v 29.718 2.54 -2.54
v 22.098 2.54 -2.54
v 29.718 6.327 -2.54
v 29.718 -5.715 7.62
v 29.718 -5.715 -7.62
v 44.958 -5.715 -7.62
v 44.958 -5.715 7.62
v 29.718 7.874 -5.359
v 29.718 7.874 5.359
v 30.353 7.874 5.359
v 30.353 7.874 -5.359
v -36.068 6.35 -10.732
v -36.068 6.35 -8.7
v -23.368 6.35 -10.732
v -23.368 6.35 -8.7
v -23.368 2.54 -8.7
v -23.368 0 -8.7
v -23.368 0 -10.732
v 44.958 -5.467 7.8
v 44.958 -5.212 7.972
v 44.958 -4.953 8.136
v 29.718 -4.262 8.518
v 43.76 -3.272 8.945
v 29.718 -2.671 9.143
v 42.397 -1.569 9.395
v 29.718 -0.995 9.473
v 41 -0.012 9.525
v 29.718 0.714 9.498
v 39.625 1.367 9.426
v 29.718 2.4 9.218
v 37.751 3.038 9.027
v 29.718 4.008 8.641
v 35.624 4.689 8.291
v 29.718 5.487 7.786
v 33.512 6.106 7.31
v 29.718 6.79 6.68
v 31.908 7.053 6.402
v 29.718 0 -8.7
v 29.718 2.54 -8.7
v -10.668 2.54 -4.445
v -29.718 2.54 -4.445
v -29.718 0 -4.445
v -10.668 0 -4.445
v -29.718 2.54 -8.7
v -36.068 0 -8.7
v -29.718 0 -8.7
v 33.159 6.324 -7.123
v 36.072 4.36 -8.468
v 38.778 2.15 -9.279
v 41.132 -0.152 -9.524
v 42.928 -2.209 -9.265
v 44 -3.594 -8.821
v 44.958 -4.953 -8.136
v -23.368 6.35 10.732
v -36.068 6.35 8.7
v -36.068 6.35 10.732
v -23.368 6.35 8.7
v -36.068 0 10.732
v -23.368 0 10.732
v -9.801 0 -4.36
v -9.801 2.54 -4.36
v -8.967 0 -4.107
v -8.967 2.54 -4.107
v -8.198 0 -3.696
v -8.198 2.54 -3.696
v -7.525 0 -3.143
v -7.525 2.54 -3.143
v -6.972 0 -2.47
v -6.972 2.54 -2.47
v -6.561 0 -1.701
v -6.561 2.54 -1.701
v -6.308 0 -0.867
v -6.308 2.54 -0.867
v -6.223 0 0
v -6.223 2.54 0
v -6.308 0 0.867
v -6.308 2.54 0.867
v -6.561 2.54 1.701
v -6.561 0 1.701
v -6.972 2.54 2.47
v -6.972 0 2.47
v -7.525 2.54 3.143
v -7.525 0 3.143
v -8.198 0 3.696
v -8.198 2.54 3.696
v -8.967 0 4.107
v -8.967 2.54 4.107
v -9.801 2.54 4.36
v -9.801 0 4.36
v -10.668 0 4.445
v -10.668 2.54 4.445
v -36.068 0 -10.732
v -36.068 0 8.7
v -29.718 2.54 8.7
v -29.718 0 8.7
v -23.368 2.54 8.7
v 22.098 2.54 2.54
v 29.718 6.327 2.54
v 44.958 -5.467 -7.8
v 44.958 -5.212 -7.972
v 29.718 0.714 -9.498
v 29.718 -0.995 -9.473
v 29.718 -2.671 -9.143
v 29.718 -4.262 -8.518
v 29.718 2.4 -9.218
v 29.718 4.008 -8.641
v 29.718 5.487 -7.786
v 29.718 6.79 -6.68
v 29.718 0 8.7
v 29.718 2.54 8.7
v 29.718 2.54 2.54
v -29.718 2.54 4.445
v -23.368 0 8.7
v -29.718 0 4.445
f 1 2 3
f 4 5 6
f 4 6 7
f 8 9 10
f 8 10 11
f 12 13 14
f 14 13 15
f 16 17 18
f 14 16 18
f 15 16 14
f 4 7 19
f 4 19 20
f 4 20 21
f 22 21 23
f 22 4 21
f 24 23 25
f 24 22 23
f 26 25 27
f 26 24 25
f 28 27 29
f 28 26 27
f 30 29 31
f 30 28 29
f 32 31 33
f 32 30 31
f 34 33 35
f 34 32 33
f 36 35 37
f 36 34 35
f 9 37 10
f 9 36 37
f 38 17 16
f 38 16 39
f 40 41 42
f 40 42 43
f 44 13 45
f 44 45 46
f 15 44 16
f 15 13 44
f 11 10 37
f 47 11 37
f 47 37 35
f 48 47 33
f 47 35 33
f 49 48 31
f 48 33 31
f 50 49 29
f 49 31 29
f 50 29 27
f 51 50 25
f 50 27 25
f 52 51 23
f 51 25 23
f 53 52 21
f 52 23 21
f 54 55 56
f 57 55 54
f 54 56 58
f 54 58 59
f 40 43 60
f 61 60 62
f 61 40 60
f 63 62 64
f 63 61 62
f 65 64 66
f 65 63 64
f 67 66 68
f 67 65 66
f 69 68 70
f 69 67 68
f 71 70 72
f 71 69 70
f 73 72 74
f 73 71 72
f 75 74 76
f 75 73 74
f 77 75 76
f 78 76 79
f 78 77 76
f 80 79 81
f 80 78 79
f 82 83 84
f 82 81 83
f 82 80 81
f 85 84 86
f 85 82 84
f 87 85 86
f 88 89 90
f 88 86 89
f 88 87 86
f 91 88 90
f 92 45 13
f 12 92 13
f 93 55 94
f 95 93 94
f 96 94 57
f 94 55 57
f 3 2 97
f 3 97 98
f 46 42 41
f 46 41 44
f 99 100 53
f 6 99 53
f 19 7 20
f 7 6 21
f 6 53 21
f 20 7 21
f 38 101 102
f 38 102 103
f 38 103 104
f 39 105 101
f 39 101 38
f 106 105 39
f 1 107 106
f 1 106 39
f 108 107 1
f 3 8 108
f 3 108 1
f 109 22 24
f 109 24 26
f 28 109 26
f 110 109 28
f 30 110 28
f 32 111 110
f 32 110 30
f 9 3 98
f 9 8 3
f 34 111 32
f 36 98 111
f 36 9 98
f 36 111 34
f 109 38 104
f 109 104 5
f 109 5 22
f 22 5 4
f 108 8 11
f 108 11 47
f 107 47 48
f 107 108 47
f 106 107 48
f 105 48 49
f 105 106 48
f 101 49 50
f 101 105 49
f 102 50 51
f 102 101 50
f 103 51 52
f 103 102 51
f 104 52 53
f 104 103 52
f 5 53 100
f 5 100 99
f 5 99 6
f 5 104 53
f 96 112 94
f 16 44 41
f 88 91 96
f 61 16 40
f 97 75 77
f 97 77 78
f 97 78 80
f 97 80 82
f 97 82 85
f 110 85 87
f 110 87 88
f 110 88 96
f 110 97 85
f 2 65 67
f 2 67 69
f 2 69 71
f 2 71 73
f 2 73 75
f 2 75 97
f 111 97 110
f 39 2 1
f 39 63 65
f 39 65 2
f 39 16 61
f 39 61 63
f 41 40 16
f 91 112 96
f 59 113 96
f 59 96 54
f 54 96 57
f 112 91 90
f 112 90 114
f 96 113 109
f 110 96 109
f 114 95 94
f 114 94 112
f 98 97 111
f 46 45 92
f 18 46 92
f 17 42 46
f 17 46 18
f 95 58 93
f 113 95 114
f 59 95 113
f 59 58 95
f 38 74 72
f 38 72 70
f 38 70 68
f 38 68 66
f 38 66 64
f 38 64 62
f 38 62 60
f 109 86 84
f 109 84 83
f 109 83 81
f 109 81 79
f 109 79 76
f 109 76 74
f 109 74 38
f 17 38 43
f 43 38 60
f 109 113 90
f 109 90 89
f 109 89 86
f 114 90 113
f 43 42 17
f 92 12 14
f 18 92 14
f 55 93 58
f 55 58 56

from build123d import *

# Parameters (mm, degrees)
SKETCH1_W               = 59.436
SKETCH1_H               = 17.399
BOSS_EXTRUDE1_DEPTH     = 2.54
CUT_EXTRUDE1_DEPTH      = 32.069155512
SKETCH3_W               = 12.7
SKETCH3_H               = 6.35
BOSS_EXTRUDE2_DEPTH     = 2.032
BOSS_EXTRUDE3_DEPTH     = 15.24
CUT_EXTRUDE2_DEPTH      = 47.886984472
CUT_EXTRUDE2_DEPTH_BACK = 47.886984472
RIB1_REACH              = 48.887
SKETCH6_WALL_W          = 104.28296917
SKETCH6_WALL_H          = 5.08


with BuildPart() as part:
    # Sketch1 → Boss-Extrude1 (new body)
    with BuildSketch(Plane(origin=(0, 0, 0), x_dir=(1, 0, 0), z_dir=(0, 1, 0))):
        Rectangle(SKETCH1_W, SKETCH1_H)
    extrude(amount=BOSS_EXTRUDE1_DEPTH)

    # Sketch2 → Cut-Extrude1 (cut, through all)
    with BuildSketch(Plane(origin=(0, 2.54, 0), x_dir=(1, 0, 0), z_dir=(0, 1, 0))):
        with BuildLine():
            Line((-29.718, 0), (-29.718, 4.445))
            Line((-29.718, 4.445), (-10.668, 4.445))
            ThreePointArc((-10.668, 4.445), (-6.223, 0), (-10.668, -4.445))
            Line((-10.668, -4.445), (-29.718, -4.445))
            Line((-29.718, -4.445), (-29.718, 0))
        make_face()
    extrude(amount=-CUT_EXTRUDE1_DEPTH, mode=Mode.SUBTRACT)

    # Sketch3 → Boss-Extrude2 (add)
    with BuildSketch(Plane.XY.offset(8.6995)):
        with Locations((-29.718, 3.175)):
            Rectangle(SKETCH3_W, SKETCH3_H)
    boss_extrude2 = extrude(amount=BOSS_EXTRUDE2_DEPTH)

    # Mirror1: Boss-Extrude2 across plane
    add(boss_extrude2.mirror(Plane.XY))

    # Sketch4 → Boss-Extrude3 (add)
    with BuildSketch(Plane(origin=(29.718, 0, 0), x_dir=(0, 0, -1), z_dir=(1, 0, 0))):
        with BuildLine():
            Line((-5.3594, 7.874163869), (5.3594, 7.874163869))
            ThreePointArc((5.3594, 7.874163869), (9.395879403, 1.563033987), (7.62, -5.715))
            Line((7.62, -5.715), (-7.62, -5.715))
            ThreePointArc((-7.62, -5.715), (-9.395879403, 1.563033987), (-5.3594, 7.874163869))
        make_face()
    extrude(amount=BOSS_EXTRUDE3_DEPTH)

    # Sketch5 → Cut-Extrude2 (cut, two sides)
    with BuildSketch(Plane.XY) as cut_extrude2_sk:
        with BuildLine():
            Line((-125.410978847, 85.578603758), (30.353, 7.874163869))
            ThreePointArc((30.353, 7.874163869), (38.487292522, 2.407660331), (44.958, -4.953))
            Line((44.958, -4.953), (142.117632376, -149.38430866))
            Line((142.117632376, -149.38430866), (371.853916425, 112.19326708))
            Line((371.853916425, 112.19326708), (104.325305202, 347.156179498))
            Line((104.325305202, 347.156179498), (-125.410978847, 85.578603758))
        make_face()
    extrude(amount=CUT_EXTRUDE2_DEPTH, mode=Mode.SUBTRACT)
    extrude(cut_extrude2_sk.sketch, amount=-CUT_EXTRUDE2_DEPTH_BACK, mode=Mode.SUBTRACT)

    # Sketch6 wall → Rib1 (add, up to next)
    with BuildSketch(Plane(origin=(25.908, 4.433322543, 0), x_dir=(0.895522388061, 0.445016463157, 0), z_dir=(-0.445016463157, 0.895522388061, 0)), mode=Mode.PRIVATE) as rib1_sk1:
        Rectangle(SKETCH6_WALL_W, SKETCH6_WALL_H)
    rib1_tool1 = extrude(rib1_sk1.sketch, amount=-RIB1_REACH, mode=Mode.PRIVATE) - part.part
    add(rib1_tool1.solids().sort_by_distance((25.908, 4.433322543, 0))[0])


solid = part.part
